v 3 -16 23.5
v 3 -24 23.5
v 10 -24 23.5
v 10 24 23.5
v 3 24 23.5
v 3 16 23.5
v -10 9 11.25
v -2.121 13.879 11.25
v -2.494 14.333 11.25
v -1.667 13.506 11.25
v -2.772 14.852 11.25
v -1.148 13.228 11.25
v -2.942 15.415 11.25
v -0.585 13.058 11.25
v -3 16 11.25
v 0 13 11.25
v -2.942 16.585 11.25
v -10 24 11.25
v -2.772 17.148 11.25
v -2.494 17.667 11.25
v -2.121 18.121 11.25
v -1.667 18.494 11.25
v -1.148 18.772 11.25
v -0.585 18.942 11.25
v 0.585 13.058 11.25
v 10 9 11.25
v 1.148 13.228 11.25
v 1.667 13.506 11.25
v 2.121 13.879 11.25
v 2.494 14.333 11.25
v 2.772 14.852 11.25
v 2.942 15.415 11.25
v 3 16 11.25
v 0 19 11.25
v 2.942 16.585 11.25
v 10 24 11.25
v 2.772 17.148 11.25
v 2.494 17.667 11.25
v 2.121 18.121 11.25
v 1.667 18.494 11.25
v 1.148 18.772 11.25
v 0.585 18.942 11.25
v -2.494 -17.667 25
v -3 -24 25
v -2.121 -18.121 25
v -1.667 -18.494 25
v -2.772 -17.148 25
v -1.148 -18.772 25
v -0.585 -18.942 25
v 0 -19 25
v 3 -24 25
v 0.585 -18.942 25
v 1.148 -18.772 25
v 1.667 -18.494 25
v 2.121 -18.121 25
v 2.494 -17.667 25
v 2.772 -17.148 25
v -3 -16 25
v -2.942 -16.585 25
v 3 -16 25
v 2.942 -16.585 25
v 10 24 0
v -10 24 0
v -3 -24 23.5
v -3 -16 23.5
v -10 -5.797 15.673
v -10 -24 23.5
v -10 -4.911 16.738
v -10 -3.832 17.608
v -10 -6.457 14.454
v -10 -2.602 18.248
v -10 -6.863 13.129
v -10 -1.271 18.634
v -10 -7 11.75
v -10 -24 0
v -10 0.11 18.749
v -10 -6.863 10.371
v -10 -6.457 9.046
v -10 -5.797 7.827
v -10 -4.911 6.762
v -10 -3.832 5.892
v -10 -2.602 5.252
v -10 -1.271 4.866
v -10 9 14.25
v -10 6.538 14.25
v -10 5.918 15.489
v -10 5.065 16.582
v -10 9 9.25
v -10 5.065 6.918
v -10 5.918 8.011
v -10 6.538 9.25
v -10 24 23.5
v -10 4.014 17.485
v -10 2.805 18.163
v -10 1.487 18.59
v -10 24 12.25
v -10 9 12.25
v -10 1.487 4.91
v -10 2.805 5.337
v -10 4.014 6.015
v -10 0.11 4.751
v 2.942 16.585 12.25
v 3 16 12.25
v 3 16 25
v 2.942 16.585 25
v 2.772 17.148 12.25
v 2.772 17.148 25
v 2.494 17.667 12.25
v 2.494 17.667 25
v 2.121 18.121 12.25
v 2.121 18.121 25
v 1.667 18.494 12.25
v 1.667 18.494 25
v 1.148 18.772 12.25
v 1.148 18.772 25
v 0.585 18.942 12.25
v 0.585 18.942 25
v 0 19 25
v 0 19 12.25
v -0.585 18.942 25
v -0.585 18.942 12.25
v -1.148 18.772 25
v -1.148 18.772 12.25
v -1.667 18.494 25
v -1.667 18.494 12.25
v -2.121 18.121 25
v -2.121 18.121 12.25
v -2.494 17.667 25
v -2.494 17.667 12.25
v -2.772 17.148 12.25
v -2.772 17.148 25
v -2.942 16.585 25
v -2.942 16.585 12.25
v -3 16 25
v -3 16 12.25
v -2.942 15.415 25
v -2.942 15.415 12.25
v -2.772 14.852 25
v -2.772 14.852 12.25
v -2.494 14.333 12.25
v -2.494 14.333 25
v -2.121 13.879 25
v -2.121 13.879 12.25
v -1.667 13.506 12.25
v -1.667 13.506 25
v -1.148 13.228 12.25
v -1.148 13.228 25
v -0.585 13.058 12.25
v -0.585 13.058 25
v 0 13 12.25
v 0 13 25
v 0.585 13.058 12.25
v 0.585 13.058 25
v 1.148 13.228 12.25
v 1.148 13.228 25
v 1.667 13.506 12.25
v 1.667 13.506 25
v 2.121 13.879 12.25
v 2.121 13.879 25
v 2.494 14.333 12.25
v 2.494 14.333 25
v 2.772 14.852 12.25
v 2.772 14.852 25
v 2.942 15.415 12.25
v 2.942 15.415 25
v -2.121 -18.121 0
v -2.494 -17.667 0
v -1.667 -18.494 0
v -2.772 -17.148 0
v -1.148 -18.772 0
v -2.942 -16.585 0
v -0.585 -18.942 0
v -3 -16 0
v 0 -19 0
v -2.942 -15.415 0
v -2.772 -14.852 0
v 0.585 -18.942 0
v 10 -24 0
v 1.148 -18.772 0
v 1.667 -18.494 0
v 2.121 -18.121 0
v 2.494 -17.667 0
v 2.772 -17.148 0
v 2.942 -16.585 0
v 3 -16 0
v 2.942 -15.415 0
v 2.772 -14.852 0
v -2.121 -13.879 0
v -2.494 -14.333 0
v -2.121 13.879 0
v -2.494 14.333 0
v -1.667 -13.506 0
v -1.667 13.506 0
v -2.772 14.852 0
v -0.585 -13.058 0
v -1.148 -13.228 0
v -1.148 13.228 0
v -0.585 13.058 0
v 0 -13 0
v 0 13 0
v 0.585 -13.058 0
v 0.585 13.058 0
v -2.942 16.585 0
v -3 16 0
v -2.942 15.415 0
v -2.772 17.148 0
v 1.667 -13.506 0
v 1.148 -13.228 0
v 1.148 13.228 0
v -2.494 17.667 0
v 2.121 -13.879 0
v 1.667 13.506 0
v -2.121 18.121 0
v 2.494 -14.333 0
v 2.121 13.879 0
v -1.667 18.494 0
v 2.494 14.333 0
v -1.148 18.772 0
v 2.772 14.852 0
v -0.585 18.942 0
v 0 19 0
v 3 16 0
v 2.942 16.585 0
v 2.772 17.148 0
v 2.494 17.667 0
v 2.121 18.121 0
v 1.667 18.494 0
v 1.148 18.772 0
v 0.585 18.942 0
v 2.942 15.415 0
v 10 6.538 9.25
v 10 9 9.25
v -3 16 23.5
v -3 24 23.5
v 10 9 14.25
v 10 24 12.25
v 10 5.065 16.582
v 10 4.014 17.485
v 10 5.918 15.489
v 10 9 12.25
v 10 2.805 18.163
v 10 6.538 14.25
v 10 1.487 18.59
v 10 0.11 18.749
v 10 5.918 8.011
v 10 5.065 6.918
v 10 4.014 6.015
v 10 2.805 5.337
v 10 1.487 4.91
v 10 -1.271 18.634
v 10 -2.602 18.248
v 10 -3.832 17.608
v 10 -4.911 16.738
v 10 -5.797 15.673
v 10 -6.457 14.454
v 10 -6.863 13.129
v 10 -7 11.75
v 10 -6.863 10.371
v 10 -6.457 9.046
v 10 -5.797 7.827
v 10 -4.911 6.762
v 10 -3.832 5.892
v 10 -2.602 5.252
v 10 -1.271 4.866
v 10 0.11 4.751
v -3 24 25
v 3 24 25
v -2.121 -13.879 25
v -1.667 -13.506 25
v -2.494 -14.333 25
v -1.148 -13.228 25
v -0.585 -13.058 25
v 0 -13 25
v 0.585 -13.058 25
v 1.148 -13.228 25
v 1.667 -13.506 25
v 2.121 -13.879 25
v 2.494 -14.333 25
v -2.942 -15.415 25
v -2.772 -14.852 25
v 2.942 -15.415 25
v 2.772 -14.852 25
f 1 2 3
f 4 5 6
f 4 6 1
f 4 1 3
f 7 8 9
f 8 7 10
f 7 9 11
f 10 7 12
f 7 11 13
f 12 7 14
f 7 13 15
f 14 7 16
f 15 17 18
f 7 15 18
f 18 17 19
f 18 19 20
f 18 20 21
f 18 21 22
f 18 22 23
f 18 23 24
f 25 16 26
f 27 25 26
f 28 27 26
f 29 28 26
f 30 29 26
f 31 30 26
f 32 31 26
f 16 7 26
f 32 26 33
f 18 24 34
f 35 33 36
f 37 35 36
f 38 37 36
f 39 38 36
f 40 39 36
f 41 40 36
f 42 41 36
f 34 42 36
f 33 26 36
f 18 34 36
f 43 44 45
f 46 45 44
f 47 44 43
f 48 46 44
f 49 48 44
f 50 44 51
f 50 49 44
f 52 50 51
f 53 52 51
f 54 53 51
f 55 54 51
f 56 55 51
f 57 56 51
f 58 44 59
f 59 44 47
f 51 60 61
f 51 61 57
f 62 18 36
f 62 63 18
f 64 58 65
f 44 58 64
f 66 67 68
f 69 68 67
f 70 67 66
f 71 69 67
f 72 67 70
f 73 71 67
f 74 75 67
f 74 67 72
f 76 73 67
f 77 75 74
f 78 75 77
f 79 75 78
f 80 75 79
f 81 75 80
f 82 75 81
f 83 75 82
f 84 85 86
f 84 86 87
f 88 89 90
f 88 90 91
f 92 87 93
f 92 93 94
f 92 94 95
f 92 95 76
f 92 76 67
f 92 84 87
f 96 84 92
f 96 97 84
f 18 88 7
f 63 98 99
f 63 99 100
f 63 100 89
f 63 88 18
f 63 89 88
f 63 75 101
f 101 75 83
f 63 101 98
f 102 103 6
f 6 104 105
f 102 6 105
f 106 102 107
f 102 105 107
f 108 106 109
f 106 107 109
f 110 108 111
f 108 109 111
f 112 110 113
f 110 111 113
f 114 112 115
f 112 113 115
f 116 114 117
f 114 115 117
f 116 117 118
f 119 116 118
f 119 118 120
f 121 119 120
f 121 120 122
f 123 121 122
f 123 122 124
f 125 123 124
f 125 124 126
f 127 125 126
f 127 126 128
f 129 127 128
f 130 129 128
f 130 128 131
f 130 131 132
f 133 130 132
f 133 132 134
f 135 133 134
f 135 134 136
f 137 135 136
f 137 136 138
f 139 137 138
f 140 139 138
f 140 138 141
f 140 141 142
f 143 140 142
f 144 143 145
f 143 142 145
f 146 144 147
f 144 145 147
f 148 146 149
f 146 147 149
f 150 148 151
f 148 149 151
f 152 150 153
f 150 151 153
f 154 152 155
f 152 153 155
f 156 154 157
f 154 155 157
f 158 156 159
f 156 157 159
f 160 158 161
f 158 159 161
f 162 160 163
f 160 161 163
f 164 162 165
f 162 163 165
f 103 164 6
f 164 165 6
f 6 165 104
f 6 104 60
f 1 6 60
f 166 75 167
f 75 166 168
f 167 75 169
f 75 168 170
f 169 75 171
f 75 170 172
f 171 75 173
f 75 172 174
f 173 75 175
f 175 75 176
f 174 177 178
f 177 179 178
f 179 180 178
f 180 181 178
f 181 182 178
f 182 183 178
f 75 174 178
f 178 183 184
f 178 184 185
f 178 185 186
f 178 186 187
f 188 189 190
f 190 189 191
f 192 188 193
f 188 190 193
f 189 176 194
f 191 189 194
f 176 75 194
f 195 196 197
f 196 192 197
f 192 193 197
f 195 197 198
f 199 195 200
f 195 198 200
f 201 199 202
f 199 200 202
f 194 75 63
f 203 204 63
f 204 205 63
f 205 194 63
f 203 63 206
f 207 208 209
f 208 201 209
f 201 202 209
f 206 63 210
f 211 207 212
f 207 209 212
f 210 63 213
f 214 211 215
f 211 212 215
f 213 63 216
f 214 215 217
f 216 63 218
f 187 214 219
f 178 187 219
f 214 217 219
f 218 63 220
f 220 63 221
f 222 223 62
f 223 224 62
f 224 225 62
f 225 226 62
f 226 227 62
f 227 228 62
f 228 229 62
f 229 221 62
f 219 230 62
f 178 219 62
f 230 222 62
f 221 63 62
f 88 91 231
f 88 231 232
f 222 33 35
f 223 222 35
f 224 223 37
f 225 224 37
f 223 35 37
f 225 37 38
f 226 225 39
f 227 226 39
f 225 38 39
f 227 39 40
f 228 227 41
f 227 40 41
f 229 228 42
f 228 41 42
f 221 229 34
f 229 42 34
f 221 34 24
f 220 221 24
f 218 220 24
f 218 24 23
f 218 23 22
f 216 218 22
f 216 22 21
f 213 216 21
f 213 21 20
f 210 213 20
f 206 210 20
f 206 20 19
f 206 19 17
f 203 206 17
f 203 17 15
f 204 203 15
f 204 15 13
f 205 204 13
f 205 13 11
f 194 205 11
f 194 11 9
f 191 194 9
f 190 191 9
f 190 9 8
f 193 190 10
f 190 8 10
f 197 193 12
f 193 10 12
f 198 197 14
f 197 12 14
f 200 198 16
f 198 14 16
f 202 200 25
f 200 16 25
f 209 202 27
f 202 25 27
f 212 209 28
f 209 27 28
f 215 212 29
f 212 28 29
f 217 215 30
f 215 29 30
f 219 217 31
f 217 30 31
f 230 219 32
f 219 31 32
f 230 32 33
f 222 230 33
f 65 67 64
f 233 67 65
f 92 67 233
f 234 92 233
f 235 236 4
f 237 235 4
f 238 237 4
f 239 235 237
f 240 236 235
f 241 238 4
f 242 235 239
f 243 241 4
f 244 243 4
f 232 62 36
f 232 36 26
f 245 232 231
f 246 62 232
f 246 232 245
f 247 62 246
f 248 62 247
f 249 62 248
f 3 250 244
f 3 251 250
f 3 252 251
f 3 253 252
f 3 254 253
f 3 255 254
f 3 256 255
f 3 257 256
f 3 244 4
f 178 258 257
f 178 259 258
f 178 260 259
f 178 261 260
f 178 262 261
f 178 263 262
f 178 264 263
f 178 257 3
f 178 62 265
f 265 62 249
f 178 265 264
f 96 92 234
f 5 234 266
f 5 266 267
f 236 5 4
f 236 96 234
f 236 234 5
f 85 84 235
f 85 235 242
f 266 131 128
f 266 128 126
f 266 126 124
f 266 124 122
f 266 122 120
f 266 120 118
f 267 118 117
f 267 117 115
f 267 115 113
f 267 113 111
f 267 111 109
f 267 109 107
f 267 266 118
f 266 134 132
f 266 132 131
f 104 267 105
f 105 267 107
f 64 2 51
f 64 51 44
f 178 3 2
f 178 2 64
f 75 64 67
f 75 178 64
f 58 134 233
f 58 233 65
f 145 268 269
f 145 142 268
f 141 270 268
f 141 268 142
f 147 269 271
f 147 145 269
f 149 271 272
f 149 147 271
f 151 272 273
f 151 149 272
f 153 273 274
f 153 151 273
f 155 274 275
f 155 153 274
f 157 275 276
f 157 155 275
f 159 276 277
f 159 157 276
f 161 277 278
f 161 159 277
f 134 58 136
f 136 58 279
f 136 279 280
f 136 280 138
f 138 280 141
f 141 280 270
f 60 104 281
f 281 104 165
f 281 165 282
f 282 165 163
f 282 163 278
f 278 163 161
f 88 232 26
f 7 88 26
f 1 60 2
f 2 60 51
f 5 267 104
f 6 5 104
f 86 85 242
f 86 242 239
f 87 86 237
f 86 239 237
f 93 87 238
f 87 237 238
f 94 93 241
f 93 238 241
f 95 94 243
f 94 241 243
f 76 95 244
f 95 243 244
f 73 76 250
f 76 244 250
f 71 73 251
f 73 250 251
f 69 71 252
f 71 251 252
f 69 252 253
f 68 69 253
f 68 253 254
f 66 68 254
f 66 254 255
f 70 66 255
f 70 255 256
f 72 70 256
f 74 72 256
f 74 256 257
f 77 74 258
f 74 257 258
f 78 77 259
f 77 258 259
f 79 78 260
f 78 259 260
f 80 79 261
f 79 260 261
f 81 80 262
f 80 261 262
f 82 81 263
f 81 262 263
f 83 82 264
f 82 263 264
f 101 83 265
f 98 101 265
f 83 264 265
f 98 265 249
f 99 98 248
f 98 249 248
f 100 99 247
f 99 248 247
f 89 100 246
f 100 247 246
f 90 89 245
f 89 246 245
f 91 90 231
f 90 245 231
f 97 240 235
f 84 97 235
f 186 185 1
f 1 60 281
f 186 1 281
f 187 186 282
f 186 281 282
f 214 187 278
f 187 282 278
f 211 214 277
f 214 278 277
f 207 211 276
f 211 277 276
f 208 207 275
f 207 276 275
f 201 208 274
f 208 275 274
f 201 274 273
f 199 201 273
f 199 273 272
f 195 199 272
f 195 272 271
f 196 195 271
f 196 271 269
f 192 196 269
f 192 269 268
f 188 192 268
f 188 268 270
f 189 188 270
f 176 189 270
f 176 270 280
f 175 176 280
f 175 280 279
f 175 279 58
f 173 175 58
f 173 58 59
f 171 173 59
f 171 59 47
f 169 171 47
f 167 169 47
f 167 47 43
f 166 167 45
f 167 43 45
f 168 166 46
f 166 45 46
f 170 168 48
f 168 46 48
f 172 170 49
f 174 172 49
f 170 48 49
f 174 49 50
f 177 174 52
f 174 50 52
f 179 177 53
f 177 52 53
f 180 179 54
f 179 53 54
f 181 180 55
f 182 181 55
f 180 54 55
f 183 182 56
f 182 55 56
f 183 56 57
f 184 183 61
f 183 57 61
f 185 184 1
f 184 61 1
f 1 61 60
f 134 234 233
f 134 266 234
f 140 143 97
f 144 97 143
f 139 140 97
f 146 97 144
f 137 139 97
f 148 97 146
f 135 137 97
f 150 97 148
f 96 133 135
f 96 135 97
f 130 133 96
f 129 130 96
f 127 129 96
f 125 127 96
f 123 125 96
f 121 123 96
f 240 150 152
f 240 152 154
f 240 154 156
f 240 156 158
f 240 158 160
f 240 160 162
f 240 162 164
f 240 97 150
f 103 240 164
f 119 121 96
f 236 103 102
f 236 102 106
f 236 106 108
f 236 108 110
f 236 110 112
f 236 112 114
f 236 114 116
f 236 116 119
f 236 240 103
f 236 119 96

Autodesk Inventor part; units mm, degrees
ref_plane "YZ Plane" through (0, 0, 0) normal (1, 0, 0) x (0, 1, 0)
ref_plane "XZ Plane" through (0, 0, 0) normal (0, 1, 0) x (-1, 0, 0)
ref_plane "XY Plane" through (0, 0, 0) normal (0, 0, 1) x (1, 0, 0)
sketch "Sketch1" plane through (0, 0, 0) normal (0, 0, 1) x (1, 0, 0)
  line L0 (0, 33.6) -> (0, -33.6) projected
  line L1 (-14, 0) -> (14, 0) projected
  line L2 (-10, 24) -> (10, 24)
  line L3 (10, 24) -> (10, -24)
  line L4 (10, -24) -> (-10, -24)
  line L5 (-10, -24) -> (-10, 24)
  point P0 (0, 0)
  dimension "d0" = 20
  dimension "d1" = 48
extrude "Extrusion1" add sketch "Sketch1" along normal blind 25
sketch "Sketch2" plane through (0, 0, 25) normal (0, 0, 1) x (1, 0, 0)
  line L0 (0, 49) -> (0, -49) projected
  line L1 (3, 35) -> (3, -35)
  line L2 (-3, 35) -> (-3, -35)
  line L3 (-10, -24) -> (10, -24) projected
  line L4 (10, -24) -> (10, 24) projected
  line L5 (10, 24) -> (-10, 24) projected
  line L6 (-10, 24) -> (-10, -24) projected
  point P0 (0, 0)
  point P1 (3, 24)
  point P2 (3, -24)
  point P3 (-3, -24)
  point P4 (-3, 24)
  dimension "d4" = 3
  dimension "d5" = 3
extrude "Extrusion2" cut sketch "Sketch2" against normal blind 1.5 contours L5 L4 L3 L1 | L2 L3 L6 L5
sketch "Sketch3" plane through (10, -24, 0) normal (1, 0, 0) x (0, 0, -1)
  line L0 (-23.5, 48) -> (-23.5, 0) projected
  line L1 (0, 0) -> (-23.5, 0) projected
  line L2 (0, 0) -> (0, 48) projected
  line L3 (0, 48) -> (-23.5, 48) projected
  line L4 (0, 0) -> (-23.5, 0) projected
  line L5 (-11.75, 0) -> (-11.75, 48)
  line L6 (0, 48) -> (-23.5, 48) projected
  line L7 (0, 24) -> (-23.5, 24)
  line L8 (-23.5, 0) -> (-23.5, 48) projected
  circle A0 centre (-11.75, 24) radius 7
  line L9 (-14.25, 28) -> (-9.25, 28)
  line L10 (-9.25, 28) -> (-9.25, 33)
  line L11 (-9.25, 33) -> (-14.25, 33)
  line L12 (-14.25, 33) -> (-14.25, 28)
  line L13 (-11.75, 17) -> (-11.75, 31)
  line L14 (-12.25, 0) -> (-12.25, 50)
  line L15 (-11.25, 0) -> (-11.25, 50)
  point P0 (-9.25, 30.5383)
  point P1 (-11.25, 33)
  point P2 (-11.25, 48)
  point P3 (-12.25, 48)
  point P4 (-12.25, 33)
  point P5 (-14.25, 30.5383)
  dimension "d8" = 14
  dimension "d9" = 5
  dimension "d10" = 5
  dimension "d11" = 11
  dimension "d12" = 0.5
  dimension "d13" = 0.5
extrude "Extrusion3" cut sketch "Sketch3" against normal through all contours L3 L5 L11 L14 | A0 L12 L9 L14 L7 | L7 L14 A0 | L3 L15 L11 L5 | L14 A0 L12 L11 | L11 L5 A0 L14 | L14 L9 L5 L7 | L7 L5 A0 L14 | A0 L14 L9 L12 | L11 L15 A0 L5 | A0 L5 L9 L14 | L7 L15 A0 L5 | L5 L9 L15 L7 | L11 L10 A0 L15 | A0 L15 L9 L5 | L15 L9 L10 A0 L7 | L7 A0 L15 | A0 L10 L9 L15
sketch "Sketch4" plane through (0, 0, 25) normal (0, 0, 1) x (1, 0, 0)
  line L0 (3, -24) -> (3, 24) projected
  line L1 (3, 24) -> (-3, 24) projected
  line L2 (-3, 24) -> (-3, -24) projected
  line L3 (-3, -24) -> (3, -24) projected
  line L4 (0, 35) -> (0, -35) projected
  circle A0 centre (0, 16) radius 3
  circle A1 centre (0, -16) radius 3
  line L5 (-10, 6.5383) -> (-10, 9) projected
  line L6 (10, 6.5383) -> (-10, 6.5383) projected
  line L7 (10, 9) -> (10, 6.5383) projected
  line L8 (10, 9) -> (-10, 9) projected
  line L9 (10, 6.5383) -> (-10, 6.5383) projected
  line L10 (10, -7) -> (-10, -7) projected
  line L11 (-10, 6.5383) -> (-10, 6.5383) projected
  line L12 (10, 6.5383) -> (-10, 6.5383) projected
  line L13 (10, 6.5383) -> (10, 6.5383) projected
  line L14 (10, 6.5383) -> (-10, 6.5383) projected
  line L15 (10, 6.5383) -> (10, -7) projected
  line L16 (-10, -7) -> (-10, 6.5383) projected
  point P0 (0, 0)
  dimension "d16" = 6
  dimension "d17" = 6
  dimension "d18" = 8
  dimension "d19" = 8
extrude "Extrusion4" cut sketch "Sketch4" against normal through all contours A1 L4 | L4 A1 | A0 L4 | L4 A0
properties part number "motor shaft clamp"
